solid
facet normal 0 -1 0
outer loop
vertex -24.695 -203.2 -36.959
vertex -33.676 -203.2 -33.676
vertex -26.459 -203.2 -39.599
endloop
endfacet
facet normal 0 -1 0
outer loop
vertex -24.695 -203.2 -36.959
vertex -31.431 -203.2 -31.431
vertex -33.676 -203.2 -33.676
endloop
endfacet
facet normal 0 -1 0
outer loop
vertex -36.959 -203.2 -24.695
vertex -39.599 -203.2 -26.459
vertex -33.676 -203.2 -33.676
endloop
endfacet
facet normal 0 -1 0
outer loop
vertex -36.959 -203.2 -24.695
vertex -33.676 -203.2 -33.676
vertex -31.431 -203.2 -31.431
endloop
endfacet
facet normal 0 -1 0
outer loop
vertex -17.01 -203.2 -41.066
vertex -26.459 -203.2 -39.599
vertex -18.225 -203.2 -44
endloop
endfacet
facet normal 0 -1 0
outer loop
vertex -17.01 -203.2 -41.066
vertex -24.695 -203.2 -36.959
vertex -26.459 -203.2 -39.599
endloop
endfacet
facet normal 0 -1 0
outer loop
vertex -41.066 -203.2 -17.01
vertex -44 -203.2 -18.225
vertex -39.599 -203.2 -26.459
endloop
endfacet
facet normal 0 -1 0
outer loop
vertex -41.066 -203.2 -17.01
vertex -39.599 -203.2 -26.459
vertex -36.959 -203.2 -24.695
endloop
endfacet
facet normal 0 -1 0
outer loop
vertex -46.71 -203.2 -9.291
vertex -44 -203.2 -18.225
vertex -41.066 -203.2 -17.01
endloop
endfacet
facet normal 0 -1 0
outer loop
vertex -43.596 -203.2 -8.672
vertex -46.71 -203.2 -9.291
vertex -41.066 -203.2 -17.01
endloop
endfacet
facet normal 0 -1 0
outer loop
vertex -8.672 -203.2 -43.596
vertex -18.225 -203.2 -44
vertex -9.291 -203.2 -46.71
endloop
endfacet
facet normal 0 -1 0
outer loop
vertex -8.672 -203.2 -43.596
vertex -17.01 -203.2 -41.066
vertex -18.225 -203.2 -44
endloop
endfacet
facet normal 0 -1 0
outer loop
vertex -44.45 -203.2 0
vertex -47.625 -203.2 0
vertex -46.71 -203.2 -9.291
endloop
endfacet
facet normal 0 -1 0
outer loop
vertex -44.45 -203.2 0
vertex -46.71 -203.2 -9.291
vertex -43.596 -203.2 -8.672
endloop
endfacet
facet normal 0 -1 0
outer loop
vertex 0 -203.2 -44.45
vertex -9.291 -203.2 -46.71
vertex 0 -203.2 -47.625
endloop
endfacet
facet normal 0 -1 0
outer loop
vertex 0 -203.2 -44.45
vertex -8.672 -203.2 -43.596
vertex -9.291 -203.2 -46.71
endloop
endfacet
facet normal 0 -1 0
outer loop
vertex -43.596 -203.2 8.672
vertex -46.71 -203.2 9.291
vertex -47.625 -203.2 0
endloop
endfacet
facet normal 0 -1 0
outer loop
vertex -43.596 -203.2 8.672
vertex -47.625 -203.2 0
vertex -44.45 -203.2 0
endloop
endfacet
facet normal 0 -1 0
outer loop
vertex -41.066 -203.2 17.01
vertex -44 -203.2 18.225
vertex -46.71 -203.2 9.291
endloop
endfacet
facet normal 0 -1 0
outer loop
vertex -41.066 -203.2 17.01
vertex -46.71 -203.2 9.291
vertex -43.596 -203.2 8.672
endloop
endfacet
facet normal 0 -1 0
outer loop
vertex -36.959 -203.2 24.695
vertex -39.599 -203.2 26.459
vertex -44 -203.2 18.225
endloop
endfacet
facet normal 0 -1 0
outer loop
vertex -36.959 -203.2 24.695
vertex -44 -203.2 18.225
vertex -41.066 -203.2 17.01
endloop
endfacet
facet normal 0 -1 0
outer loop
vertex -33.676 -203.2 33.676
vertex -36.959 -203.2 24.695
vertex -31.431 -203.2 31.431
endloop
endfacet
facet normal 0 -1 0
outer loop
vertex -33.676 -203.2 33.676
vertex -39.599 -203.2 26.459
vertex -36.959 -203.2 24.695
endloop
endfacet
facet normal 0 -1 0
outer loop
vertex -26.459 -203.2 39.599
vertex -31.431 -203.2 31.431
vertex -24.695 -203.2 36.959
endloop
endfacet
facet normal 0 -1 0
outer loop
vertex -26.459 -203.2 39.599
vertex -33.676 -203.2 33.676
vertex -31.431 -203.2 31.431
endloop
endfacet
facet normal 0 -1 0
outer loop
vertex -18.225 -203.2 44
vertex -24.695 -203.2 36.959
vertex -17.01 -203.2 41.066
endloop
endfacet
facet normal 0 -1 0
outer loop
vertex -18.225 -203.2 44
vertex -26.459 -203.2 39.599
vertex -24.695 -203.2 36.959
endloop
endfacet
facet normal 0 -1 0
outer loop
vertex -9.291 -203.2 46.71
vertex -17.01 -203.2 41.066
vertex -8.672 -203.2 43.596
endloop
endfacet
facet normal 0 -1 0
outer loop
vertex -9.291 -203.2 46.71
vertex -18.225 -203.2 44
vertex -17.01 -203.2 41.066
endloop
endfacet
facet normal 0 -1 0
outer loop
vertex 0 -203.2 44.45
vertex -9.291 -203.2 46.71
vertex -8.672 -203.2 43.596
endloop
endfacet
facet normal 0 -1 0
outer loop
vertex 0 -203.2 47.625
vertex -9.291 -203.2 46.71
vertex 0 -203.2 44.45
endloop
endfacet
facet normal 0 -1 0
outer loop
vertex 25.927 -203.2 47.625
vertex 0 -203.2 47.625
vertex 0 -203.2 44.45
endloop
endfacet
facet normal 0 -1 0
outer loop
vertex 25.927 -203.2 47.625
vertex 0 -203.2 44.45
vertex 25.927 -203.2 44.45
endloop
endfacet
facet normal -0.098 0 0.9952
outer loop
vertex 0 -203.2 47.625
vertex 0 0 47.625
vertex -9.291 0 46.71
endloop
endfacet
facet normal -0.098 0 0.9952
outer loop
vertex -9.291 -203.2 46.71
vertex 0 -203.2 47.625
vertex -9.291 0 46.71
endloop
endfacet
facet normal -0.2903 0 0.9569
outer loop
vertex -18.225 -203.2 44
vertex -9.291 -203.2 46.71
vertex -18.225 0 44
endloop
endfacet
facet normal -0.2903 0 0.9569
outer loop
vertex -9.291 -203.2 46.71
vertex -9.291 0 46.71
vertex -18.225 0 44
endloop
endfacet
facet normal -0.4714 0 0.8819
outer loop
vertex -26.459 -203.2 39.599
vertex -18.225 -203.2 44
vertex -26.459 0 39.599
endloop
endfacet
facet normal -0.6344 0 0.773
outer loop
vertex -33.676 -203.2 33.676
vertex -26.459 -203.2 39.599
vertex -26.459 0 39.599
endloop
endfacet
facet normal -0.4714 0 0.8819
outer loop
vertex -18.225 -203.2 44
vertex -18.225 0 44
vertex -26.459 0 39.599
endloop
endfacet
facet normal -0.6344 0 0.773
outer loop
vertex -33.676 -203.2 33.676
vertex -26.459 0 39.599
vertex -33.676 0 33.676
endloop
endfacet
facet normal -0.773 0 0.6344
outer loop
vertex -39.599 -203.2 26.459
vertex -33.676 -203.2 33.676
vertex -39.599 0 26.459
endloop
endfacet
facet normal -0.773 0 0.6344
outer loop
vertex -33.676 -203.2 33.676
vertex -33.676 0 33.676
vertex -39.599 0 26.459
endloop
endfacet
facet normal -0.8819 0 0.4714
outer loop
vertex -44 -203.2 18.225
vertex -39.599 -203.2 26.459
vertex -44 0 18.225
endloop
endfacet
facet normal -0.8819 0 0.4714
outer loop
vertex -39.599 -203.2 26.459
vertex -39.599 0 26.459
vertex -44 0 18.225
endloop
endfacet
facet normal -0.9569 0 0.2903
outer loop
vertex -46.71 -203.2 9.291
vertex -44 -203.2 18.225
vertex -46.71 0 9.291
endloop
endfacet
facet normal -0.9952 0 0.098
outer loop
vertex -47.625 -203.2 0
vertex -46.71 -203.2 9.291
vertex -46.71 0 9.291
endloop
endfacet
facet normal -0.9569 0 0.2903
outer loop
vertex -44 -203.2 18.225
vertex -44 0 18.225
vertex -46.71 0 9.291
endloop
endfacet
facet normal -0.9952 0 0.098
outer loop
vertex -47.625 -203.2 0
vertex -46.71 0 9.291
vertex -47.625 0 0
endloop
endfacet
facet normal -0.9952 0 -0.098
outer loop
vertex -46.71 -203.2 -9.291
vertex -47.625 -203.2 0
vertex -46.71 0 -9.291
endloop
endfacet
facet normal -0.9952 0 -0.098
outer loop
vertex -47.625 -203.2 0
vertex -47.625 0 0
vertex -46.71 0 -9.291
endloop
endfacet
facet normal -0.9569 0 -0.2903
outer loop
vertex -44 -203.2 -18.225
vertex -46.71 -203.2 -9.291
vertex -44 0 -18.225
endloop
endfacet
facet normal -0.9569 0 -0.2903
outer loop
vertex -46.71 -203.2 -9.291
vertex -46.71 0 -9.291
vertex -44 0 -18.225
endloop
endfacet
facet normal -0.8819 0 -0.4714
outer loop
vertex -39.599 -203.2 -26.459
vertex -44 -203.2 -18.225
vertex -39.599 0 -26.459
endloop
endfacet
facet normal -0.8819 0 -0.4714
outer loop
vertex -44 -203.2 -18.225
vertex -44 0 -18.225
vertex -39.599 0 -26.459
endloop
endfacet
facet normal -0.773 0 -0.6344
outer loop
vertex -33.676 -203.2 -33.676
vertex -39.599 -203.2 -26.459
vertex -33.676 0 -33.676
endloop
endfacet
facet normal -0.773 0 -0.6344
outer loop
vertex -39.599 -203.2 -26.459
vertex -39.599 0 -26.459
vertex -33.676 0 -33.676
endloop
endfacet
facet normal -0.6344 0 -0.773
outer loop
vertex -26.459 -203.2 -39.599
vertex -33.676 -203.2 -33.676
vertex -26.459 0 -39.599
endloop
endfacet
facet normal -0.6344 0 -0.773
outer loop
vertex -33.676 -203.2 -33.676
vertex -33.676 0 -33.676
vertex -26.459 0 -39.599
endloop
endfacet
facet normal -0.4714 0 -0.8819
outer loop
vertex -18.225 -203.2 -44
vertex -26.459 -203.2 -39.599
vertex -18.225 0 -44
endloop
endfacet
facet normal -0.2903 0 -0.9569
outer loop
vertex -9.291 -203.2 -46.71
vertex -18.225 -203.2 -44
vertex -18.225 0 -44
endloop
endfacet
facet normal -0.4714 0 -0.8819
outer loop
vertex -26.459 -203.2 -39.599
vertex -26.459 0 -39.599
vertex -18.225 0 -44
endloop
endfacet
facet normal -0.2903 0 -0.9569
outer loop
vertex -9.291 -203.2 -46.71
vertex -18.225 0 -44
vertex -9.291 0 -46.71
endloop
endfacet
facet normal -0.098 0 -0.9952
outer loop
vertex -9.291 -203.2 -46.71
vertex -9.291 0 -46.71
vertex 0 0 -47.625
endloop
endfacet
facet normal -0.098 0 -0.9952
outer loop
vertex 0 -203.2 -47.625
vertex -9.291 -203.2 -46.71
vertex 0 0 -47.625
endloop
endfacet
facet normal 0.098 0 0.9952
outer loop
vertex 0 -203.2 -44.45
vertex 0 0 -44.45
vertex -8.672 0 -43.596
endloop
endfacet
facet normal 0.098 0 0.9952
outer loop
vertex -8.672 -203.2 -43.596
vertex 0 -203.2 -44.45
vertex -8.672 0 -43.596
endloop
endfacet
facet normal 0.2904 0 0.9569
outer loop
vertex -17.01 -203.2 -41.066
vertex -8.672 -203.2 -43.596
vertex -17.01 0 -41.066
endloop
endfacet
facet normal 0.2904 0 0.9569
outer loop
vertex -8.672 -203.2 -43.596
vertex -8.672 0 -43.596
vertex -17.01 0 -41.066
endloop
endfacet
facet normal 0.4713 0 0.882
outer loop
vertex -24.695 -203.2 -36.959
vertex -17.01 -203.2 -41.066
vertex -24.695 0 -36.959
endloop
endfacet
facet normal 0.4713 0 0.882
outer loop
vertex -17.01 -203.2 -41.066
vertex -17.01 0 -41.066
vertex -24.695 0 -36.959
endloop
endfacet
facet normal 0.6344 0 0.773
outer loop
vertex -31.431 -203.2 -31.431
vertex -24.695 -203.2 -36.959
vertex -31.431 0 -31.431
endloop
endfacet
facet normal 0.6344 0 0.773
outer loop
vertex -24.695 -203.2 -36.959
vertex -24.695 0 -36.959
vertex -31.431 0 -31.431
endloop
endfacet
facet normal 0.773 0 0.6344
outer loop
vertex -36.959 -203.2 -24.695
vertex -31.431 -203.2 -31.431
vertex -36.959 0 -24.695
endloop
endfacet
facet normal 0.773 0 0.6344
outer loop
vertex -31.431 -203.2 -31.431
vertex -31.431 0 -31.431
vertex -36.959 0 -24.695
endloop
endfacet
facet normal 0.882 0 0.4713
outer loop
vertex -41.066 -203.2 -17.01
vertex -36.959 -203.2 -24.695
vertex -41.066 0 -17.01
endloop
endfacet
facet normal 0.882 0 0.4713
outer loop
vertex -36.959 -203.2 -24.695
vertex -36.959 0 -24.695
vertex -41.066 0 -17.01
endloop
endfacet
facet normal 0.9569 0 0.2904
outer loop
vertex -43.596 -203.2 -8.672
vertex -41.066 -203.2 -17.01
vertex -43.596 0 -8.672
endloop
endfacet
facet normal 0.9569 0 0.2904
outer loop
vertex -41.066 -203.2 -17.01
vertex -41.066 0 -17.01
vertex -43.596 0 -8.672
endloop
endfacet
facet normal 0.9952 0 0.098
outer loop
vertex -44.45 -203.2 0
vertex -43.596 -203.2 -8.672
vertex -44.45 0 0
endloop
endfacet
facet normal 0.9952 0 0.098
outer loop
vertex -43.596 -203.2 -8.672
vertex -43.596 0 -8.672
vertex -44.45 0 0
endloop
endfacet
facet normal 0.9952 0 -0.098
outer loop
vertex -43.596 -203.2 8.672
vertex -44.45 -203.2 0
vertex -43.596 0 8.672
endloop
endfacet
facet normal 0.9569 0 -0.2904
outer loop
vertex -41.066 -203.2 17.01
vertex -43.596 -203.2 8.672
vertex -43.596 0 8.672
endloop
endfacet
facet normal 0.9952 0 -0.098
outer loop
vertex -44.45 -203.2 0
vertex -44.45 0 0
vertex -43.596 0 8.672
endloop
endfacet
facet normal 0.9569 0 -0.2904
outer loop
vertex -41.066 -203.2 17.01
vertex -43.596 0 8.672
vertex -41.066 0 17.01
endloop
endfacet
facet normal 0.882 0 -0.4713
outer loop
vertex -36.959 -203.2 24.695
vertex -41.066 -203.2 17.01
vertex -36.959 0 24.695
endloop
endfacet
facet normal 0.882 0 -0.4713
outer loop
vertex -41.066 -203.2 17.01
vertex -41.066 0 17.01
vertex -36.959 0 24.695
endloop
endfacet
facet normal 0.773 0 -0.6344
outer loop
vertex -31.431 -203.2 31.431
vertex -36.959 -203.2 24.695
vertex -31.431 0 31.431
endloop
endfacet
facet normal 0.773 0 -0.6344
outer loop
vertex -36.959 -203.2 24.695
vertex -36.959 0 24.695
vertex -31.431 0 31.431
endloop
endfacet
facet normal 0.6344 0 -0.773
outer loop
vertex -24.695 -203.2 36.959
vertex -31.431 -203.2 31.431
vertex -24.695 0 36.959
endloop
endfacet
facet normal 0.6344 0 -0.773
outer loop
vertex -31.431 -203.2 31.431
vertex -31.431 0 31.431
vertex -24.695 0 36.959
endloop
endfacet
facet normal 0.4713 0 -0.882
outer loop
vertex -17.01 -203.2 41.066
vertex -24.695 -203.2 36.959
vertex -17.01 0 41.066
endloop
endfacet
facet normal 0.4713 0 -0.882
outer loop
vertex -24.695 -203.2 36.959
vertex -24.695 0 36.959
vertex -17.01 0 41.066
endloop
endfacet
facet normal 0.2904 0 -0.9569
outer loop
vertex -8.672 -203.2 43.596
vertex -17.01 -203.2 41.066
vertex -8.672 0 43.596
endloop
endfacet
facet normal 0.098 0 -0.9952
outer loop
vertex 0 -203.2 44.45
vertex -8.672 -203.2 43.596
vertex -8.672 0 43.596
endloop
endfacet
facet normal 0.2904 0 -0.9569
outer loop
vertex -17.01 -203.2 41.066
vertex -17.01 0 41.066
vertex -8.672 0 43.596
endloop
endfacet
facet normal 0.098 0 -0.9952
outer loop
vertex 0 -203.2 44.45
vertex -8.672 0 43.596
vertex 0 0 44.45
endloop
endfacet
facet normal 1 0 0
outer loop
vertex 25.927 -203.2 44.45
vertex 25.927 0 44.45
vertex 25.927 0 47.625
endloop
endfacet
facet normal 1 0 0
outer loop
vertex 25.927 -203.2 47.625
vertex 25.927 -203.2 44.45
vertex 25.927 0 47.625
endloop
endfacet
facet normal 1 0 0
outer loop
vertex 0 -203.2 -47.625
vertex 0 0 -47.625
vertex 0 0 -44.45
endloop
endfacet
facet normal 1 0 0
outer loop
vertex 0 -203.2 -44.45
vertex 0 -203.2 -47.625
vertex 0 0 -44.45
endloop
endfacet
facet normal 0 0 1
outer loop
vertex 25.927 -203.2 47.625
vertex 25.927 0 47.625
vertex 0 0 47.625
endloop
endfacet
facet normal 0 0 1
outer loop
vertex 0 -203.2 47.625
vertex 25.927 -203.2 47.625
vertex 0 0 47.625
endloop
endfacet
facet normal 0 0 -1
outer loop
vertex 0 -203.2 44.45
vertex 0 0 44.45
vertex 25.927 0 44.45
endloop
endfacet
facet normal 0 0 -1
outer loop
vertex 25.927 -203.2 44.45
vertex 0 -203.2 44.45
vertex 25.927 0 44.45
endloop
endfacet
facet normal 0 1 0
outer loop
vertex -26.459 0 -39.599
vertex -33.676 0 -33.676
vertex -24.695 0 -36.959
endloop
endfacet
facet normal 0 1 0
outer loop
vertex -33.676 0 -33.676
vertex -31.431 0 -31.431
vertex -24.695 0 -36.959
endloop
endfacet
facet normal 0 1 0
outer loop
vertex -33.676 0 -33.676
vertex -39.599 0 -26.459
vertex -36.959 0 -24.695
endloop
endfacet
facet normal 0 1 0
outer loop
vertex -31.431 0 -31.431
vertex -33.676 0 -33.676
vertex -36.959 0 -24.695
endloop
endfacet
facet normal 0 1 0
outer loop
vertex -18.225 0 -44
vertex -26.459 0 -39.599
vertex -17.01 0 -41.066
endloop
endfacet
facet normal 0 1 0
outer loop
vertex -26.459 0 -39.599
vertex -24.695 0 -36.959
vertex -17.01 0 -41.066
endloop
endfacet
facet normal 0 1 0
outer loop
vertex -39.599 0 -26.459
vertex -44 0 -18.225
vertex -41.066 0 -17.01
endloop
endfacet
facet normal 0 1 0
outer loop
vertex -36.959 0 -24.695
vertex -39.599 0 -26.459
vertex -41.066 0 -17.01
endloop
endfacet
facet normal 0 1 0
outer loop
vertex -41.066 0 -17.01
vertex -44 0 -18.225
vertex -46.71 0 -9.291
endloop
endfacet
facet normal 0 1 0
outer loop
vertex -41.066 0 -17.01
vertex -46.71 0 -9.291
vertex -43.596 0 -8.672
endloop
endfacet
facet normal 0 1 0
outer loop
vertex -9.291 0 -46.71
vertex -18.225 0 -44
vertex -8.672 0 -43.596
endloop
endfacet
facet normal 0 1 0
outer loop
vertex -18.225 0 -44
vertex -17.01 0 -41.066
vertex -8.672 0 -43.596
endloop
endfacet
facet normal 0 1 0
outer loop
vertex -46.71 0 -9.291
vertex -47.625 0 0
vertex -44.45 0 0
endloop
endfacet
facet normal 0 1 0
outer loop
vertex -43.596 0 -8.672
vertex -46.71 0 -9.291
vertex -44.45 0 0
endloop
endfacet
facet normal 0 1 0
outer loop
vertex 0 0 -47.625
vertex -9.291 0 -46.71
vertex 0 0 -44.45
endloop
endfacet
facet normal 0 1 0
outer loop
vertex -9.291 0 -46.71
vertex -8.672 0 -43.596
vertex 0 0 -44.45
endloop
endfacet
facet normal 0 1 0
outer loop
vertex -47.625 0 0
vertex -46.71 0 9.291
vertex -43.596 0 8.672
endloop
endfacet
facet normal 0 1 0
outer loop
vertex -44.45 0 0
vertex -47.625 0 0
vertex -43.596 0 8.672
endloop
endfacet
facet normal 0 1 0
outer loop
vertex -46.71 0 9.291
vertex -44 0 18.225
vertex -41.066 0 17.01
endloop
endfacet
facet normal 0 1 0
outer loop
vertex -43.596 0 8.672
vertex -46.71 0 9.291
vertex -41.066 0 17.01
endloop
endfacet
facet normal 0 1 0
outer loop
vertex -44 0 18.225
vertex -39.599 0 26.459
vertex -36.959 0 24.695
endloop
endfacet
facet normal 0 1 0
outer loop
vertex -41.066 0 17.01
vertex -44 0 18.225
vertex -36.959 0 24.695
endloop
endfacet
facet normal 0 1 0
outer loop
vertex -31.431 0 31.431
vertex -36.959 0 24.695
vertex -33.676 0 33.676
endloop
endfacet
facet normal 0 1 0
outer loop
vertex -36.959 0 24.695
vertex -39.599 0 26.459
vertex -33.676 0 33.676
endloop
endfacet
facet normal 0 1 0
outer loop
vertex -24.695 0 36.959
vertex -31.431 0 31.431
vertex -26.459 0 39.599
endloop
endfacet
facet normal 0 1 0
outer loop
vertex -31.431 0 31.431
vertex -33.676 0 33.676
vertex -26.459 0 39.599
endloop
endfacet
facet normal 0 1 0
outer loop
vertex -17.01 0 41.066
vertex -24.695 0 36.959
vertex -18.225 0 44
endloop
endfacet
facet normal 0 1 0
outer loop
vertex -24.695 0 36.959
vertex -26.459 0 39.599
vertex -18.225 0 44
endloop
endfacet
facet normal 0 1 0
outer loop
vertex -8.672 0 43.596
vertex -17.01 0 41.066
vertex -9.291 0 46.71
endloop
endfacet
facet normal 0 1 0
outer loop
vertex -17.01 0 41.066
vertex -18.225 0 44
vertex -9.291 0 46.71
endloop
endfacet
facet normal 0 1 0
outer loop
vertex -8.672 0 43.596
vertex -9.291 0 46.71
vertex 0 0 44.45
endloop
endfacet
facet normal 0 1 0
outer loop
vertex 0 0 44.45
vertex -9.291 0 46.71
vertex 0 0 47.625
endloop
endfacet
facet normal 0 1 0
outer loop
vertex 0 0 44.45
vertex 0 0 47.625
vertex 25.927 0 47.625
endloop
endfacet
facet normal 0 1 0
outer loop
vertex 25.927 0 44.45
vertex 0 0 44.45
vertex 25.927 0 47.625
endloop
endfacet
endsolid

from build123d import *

# Parameters (mm, degrees)
F1_DEPTH = 203.2
F2_DEPTH = 25.4


with BuildPart() as f1:
    # F0 (on Front) → F1 (new body)
    with BuildSketch(Plane.XZ):
        with BuildLine():
            ThreePointArc((0, -44.45), (-44.45, 0), (0, 44.45))
            Line((0, 44.45), (25.92662, 44.45))
            Line((25.92662, 44.45), (25.92662, 47.625))
            Line((25.92662, 47.625), (0, 47.625))
            ThreePointArc((0, 47.625), (-47.625, 0), (0, -47.625))
            Line((0, -47.625), (0, -44.45))
        make_face()
    extrude(amount=F1_DEPTH)

    # F0 (on Front) → F2 (join)
    with BuildSketch(Plane.XZ):
        with BuildLine():
            ThreePointArc((0, -44.45), (-44.45, 0), (0, 44.45))
            Line((0, 44.45), (25.92662, 44.45))
            Line((25.92662, 44.45), (25.92662, 47.625))
            Line((25.92662, 47.625), (0, 47.625))
            ThreePointArc((0, 47.625), (-47.625, 0), (0, -47.625))
            Line((0, -47.625), (0, -44.45))
        make_face()
    extrude(amount=F2_DEPTH)


solid = f1.part
